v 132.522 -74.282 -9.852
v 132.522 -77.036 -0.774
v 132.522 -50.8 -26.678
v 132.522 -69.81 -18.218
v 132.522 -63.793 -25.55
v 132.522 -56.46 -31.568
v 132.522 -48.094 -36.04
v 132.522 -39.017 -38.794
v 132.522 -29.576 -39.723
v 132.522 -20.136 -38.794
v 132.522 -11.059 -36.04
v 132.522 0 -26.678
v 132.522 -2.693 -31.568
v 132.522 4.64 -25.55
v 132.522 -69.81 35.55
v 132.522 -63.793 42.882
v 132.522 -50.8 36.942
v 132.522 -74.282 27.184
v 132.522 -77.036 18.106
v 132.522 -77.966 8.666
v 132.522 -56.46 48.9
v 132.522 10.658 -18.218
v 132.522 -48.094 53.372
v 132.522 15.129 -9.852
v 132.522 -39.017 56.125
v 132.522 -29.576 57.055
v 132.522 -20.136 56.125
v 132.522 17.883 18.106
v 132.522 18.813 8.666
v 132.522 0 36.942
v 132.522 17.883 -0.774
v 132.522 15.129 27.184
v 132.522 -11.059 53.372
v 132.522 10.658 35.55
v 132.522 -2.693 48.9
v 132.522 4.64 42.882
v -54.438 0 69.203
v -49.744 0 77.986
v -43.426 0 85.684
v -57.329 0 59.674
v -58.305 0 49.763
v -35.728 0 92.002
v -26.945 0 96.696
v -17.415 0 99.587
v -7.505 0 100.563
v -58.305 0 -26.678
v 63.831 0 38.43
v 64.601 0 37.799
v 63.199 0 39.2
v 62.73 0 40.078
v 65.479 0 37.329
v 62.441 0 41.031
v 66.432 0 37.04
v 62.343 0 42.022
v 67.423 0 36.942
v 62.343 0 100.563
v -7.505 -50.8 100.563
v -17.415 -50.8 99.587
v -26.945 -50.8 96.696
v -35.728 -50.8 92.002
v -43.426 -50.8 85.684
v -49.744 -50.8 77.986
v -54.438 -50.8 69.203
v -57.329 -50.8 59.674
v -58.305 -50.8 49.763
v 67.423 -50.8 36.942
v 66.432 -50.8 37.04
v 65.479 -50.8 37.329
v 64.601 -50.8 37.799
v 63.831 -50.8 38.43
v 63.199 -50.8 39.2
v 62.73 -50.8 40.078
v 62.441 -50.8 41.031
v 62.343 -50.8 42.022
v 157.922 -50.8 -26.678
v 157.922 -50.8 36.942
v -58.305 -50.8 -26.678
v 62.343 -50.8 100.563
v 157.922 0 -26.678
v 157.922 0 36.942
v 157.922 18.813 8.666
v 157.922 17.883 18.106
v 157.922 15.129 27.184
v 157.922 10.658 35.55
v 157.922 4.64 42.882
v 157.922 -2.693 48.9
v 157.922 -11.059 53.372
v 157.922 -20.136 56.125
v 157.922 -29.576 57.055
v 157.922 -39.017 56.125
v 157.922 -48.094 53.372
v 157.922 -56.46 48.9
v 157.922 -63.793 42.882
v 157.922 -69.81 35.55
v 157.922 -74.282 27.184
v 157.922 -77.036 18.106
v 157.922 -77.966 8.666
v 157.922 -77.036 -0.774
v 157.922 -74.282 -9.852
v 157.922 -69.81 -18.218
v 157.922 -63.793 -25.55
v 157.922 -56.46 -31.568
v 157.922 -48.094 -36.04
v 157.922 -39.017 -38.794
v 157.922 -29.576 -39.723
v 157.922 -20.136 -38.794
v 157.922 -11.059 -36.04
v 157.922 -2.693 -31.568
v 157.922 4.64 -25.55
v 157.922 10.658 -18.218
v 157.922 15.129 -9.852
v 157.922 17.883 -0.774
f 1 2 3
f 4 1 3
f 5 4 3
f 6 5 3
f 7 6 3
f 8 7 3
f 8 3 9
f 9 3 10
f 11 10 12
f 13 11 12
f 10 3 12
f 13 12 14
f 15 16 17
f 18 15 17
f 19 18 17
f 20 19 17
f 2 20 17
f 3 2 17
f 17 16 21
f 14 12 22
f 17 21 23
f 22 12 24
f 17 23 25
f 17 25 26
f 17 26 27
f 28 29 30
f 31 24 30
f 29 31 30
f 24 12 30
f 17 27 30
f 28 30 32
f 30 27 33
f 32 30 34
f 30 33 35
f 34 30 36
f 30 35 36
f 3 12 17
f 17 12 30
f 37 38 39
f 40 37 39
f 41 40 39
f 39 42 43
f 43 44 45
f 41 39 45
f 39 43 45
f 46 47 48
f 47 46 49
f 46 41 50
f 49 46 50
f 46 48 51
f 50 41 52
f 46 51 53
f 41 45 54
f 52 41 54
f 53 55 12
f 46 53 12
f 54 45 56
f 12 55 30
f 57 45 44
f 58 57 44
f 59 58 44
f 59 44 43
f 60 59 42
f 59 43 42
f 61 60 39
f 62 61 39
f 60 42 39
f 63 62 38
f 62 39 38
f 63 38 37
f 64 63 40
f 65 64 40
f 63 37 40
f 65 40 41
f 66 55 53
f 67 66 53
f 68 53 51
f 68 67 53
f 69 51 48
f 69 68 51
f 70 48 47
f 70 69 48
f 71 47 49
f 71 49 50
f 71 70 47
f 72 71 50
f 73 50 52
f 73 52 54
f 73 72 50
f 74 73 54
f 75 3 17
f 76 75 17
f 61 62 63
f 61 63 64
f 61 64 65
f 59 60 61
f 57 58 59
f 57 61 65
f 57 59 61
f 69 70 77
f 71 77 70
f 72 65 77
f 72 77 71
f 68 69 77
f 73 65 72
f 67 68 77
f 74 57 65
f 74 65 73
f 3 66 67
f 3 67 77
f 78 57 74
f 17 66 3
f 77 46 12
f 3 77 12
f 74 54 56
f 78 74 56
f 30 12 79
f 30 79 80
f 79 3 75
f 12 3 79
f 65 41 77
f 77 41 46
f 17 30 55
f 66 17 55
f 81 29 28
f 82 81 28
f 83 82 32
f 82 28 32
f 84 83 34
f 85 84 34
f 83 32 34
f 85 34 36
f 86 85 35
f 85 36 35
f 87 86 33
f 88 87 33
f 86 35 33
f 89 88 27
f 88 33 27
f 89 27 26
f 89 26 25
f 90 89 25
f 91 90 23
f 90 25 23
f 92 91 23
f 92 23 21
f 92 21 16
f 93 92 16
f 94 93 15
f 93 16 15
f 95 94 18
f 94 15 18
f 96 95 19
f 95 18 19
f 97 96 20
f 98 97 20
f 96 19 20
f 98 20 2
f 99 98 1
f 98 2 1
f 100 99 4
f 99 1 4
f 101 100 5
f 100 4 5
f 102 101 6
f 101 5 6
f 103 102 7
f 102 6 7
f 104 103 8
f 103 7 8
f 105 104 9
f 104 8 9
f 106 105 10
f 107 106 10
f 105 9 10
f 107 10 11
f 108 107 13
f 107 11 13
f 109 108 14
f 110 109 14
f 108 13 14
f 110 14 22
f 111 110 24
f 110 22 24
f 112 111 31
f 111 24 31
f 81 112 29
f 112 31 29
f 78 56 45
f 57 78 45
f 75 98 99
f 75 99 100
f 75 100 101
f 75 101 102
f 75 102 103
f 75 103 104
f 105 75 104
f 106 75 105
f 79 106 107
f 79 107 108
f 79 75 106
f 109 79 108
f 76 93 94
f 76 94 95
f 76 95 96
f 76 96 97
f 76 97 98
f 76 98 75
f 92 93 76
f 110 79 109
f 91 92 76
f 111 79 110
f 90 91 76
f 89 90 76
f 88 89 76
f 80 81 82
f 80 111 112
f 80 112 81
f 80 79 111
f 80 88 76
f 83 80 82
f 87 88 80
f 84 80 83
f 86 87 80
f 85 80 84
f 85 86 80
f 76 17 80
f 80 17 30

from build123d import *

# Parameters (mm, degrees)
F1_DEPTH = 50.8
F2_R     = 5.08
F3_R     = 48.38921
F3_W     = 50.8
F3_H     = 63.620596
F4_DEPTH = 25.4


with BuildPart() as f1:
    # F0 (on Front) → F1 (new body)
    with BuildSketch(Plane.XZ):
        with BuildLine():
            Line((62.343281, 100.563001), (-7.50485, 100.563001))
            ThreePointArc((-7.50485, 100.563001), (-43.425874, 85.684025), (-58.30485, 49.763001))
            Line((-58.30485, 49.763001), (-58.30485, -26.678191))
            Line((-58.30485, -26.678191), (62.343281, -26.678191))
            Line((62.343281, -26.678191), (132.522136, -26.678191))
            Line((132.522136, -26.678191), (132.522136, 36.942405))
            Line((132.522136, 36.942405), (62.343281, 36.942405))
            Line((62.343281, 36.942405), (62.343281, 100.563001))
        make_face()
    extrude(amount=F1_DEPTH)

    # F2
    f2_edges = [f1.edges().sort_by_distance(p)[0] for p in [
        (62.343281, -25.4, 36.942405),
    ]]
    fillet(f2_edges, radius=F2_R)


with BuildPart() as f4:
    # F3 (on face) → F4 (new body)
    with BuildSketch(Plane.YZ.offset(132.522136)):
        with Locations((-29.576318, 8.665922)):
            Circle(F3_R)
        with Locations((-25.4, 5.132107)):
            Rectangle(F3_W, F3_H, mode=Mode.SUBTRACT)
    extrude(amount=F4_DEPTH)


solid = Compound([f1.part, f4.part])
